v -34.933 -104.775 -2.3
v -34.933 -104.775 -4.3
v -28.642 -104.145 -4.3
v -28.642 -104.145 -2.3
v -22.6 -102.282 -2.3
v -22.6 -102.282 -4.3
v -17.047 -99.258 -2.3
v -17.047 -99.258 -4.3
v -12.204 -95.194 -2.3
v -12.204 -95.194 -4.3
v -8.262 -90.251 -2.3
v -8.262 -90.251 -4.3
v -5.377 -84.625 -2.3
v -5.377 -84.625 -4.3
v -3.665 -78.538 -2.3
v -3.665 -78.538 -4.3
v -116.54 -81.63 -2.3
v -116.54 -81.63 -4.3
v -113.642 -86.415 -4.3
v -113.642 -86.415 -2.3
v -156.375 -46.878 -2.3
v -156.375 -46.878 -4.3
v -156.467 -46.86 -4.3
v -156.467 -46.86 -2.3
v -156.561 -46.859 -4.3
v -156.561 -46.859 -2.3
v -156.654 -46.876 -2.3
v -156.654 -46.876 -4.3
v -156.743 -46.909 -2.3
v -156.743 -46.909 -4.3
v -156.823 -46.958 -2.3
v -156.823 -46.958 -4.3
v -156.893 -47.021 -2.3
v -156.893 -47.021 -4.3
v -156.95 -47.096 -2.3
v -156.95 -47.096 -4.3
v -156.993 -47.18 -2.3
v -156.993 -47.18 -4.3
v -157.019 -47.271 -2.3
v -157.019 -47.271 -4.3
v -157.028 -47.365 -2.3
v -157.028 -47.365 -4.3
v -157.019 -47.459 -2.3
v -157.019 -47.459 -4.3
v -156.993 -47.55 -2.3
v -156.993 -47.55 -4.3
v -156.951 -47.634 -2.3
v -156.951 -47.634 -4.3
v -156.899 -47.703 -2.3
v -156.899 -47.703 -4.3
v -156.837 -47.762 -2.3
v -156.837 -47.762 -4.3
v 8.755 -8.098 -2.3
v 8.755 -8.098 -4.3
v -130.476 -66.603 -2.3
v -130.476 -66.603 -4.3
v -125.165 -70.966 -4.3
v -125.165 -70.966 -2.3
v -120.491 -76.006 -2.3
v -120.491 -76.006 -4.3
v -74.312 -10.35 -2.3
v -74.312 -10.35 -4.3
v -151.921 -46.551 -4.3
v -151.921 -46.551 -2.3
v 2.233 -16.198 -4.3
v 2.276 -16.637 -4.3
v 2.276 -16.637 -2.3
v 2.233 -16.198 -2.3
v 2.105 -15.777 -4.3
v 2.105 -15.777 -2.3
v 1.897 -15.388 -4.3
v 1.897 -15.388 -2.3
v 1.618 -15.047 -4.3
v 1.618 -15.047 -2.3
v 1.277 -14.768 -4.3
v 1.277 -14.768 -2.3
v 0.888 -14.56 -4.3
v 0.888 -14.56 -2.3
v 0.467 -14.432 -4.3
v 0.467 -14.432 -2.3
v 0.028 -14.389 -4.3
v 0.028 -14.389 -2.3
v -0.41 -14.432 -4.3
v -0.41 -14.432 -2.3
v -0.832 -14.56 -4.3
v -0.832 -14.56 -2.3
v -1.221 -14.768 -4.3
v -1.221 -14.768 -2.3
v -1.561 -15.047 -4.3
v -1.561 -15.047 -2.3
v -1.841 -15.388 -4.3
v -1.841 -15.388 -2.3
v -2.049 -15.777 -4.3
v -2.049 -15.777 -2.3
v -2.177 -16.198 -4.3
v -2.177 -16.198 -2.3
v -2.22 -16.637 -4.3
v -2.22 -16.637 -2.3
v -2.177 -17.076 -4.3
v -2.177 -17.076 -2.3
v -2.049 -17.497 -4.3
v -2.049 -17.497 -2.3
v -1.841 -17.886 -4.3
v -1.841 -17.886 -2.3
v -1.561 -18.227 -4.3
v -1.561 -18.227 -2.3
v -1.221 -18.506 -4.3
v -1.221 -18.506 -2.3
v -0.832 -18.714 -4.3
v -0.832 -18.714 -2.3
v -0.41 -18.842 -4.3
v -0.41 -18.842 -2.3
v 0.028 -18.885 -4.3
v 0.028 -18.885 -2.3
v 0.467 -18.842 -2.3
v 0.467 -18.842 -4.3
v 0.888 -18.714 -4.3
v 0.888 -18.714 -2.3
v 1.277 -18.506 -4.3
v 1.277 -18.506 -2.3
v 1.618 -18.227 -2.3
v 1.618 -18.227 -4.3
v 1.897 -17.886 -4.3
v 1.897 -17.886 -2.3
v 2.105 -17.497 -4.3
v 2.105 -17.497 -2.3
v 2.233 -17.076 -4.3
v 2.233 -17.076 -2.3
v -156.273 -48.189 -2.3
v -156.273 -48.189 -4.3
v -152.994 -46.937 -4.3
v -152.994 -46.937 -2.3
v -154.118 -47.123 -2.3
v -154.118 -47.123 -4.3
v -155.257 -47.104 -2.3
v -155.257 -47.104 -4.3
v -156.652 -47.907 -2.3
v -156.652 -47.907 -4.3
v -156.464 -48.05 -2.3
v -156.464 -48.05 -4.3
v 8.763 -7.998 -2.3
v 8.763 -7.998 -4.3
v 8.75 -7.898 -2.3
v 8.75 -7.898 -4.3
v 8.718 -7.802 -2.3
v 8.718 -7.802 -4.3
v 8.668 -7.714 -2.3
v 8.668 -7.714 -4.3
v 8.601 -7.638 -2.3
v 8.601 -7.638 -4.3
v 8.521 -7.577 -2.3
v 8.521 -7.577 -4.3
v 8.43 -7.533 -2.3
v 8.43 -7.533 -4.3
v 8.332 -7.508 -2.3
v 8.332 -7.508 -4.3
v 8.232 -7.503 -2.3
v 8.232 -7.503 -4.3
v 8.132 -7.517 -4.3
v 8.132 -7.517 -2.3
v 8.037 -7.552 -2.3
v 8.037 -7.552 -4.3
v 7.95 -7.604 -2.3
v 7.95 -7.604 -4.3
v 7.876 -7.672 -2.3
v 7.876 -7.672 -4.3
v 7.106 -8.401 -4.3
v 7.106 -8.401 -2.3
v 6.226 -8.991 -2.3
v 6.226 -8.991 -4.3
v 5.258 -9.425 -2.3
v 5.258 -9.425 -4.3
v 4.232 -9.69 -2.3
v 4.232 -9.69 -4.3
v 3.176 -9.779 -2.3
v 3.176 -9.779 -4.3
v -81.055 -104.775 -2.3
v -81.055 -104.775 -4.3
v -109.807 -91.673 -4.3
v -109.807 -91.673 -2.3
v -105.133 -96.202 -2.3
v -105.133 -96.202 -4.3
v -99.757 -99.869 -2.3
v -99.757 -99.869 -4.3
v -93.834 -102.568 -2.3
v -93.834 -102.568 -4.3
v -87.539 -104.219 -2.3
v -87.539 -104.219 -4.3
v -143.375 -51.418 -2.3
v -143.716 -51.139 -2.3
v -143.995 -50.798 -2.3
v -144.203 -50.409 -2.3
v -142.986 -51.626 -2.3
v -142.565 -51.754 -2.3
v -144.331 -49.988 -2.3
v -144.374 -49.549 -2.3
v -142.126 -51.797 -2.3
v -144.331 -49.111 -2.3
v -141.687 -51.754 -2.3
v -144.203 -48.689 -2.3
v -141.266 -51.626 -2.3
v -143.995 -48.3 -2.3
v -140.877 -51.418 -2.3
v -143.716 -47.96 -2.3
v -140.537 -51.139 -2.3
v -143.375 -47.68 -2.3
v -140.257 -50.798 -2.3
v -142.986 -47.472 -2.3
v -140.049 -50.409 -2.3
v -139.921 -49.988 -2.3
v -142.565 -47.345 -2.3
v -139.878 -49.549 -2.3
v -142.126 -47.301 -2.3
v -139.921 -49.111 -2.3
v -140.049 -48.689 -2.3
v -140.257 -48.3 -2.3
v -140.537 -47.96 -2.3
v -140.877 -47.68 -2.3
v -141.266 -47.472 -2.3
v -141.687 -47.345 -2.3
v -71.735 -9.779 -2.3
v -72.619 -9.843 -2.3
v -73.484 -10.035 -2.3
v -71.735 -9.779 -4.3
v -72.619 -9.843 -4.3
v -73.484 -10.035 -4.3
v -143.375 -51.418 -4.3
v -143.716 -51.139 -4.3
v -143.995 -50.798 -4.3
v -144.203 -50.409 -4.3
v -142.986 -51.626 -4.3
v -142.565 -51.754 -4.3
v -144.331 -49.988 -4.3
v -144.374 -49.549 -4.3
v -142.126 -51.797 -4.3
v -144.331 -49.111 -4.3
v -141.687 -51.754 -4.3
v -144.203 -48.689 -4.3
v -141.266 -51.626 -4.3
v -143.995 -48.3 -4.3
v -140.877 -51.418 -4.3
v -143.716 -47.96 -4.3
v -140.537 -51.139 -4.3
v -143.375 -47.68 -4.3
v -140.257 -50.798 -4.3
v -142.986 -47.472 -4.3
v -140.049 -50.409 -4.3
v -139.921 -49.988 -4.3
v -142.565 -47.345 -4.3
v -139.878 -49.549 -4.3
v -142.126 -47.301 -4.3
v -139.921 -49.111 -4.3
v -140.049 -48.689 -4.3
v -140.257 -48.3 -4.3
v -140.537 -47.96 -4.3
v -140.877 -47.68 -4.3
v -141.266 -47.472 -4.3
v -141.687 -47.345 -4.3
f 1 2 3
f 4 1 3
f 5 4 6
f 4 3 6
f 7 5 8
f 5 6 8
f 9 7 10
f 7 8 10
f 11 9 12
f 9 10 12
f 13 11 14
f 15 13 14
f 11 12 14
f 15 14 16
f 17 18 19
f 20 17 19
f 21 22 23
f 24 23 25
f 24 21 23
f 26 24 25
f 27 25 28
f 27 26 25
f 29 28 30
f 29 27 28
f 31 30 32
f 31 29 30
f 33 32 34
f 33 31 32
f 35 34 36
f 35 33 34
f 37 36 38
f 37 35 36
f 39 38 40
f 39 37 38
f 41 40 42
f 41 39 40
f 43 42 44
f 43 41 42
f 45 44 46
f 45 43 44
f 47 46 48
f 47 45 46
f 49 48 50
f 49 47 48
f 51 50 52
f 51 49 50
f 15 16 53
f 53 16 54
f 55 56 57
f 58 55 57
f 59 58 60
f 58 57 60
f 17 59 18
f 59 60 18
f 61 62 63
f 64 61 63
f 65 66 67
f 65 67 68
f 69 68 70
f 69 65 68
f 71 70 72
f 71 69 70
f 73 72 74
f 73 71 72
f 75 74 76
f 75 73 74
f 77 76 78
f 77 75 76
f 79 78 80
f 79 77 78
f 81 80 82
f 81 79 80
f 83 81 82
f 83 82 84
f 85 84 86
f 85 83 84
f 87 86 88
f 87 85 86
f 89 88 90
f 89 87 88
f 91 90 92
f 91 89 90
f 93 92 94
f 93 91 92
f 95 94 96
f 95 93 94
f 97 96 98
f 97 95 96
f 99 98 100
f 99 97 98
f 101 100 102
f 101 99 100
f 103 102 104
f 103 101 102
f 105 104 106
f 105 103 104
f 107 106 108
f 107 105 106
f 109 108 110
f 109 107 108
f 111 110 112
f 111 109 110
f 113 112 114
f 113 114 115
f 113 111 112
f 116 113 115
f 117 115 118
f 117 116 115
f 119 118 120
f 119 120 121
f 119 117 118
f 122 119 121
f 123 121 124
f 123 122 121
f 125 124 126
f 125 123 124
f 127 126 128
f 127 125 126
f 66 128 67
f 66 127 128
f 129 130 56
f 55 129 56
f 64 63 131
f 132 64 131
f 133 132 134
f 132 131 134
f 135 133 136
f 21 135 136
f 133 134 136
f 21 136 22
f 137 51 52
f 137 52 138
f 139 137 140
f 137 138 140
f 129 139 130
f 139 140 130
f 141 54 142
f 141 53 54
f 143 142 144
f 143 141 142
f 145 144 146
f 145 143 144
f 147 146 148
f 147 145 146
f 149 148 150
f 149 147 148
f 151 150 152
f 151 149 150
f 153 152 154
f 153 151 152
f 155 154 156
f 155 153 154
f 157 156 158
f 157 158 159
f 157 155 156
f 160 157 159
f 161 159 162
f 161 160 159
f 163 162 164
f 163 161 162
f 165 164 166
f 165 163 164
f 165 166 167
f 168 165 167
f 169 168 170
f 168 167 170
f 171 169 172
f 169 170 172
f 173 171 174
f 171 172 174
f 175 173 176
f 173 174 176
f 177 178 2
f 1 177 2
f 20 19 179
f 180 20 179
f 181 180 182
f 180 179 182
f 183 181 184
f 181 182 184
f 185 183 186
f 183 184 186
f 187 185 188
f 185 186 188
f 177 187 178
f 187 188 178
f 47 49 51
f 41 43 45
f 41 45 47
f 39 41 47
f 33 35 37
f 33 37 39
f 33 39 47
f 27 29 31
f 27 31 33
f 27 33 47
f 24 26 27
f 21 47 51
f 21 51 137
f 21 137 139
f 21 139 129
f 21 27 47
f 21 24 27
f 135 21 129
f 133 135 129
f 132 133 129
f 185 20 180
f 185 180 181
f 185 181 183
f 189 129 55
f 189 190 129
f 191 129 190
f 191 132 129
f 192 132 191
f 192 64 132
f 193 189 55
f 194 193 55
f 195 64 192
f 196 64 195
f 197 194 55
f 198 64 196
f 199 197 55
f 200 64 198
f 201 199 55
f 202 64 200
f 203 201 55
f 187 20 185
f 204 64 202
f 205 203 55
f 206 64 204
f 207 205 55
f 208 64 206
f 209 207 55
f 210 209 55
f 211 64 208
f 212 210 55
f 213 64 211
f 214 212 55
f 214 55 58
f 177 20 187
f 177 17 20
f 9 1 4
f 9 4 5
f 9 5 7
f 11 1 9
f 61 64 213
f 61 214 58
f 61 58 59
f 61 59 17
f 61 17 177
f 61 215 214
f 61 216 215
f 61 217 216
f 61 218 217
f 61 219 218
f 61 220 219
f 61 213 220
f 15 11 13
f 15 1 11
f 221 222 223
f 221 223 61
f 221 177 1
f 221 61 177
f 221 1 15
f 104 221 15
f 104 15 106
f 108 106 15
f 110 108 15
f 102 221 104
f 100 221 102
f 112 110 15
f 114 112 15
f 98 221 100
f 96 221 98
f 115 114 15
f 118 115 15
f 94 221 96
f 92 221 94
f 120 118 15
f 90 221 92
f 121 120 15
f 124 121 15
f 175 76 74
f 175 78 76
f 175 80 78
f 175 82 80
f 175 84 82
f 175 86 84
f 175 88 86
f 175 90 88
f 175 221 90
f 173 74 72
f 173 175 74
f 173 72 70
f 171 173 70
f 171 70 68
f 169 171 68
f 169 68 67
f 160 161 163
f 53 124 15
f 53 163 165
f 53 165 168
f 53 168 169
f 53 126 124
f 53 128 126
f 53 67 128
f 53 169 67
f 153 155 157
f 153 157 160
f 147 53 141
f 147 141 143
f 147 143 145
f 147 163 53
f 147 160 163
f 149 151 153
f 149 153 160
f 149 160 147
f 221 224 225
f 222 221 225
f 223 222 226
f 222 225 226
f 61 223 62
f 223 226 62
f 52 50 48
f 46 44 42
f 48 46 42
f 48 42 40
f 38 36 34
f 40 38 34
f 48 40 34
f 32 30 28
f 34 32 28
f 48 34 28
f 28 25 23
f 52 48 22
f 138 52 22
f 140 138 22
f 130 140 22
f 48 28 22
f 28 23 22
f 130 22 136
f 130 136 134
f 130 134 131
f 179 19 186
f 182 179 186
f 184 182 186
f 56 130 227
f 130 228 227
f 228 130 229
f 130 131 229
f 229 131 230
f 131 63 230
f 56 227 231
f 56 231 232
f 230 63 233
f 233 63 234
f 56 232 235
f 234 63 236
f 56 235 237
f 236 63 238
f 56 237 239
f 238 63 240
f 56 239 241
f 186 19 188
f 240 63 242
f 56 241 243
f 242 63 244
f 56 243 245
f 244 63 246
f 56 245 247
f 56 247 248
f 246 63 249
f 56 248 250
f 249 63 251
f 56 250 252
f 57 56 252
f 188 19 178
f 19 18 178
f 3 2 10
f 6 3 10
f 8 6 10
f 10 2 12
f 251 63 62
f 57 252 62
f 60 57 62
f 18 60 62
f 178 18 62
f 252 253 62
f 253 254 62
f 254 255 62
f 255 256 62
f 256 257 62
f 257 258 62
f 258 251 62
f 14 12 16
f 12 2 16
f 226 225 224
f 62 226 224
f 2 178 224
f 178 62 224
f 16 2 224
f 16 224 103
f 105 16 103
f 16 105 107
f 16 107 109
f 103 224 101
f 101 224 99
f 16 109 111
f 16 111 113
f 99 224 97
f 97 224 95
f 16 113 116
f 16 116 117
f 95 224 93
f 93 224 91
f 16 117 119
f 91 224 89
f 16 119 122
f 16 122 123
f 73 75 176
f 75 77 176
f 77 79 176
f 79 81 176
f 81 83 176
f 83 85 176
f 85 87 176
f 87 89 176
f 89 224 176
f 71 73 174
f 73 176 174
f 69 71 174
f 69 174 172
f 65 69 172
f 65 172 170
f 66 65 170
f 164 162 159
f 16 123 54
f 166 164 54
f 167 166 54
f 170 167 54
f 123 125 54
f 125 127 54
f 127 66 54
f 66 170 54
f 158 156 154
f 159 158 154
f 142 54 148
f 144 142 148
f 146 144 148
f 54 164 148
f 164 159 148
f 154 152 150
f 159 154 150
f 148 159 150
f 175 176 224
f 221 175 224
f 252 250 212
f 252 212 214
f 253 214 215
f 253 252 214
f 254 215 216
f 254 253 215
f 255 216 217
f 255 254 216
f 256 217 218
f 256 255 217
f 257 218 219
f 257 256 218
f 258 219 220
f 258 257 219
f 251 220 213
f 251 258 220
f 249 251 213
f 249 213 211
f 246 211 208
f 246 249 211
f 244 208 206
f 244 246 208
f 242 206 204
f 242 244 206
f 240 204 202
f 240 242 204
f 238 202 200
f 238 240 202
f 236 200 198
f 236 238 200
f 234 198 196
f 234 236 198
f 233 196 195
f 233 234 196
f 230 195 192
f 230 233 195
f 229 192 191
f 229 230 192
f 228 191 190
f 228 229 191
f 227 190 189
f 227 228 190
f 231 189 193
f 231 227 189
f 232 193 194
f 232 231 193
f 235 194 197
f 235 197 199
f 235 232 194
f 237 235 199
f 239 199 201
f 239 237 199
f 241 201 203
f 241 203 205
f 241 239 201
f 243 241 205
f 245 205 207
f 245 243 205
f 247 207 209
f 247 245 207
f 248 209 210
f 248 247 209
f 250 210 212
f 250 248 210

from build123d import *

# Parameters (mm, degrees)
BOSS_EXTRUDE1_OUTLINE_R = 2.2479
BOSS_EXTRUDE1_DEPTH     = 2
FILLET1_R               = 0.508


# Read off the part's stored shape, not the designer's step: Boss-Extrude1
with BuildPart() as part:
    # Boss-Extrude1 outline → Boss-Extrude1 (new body)
    with BuildSketch(Plane.XY.offset(-4.3)):
        with BuildLine():
            Line((-3.665078359, -78.538329641), (9.376516015, -4.575772565))
            ThreePointArc((9.376516015, -4.575772565), (7.222943475, -8.305869622), (3.175551027, -9.779))
            Line((3.175551027, -9.779), (-71.734942292, -9.779))
            ThreePointArc((-71.734942292, -9.779), (-73.054687902, -9.923572648), (-74.311835376, -10.350433227))
            Line((-74.311835376, -10.350433227), (-151.921287837, -46.550785133))
            ThreePointArc((-151.921287837, -46.550785133), (-156.284298691, -46.904620517), (-159.820994296, -44.325309098))
            ThreePointArc((-159.820994296, -44.325309098), (-158.24873565, -46.442088317), (-156.273248149, -48.188570679))
            Line((-156.273248149, -48.188570679), (-130.476004779, -66.603469659))
            ThreePointArc((-130.476004779, -66.603469659), (-122.742535166, -73.406833136), (-116.540360394, -81.630295604))
            Line((-116.540360394, -81.630295604), (-113.642182841, -86.414778297))
            ThreePointArc((-113.642182841, -86.414778297), (-99.756521843, -99.869092495), (-81.054590835, -104.775))
            Line((-81.054590835, -104.775), (-34.932724517, -104.775))
            ThreePointArc((-34.932724517, -104.775), (-14.52421791, -97.346911069), (-3.665078359, -78.538329641))
        make_face()
        with Locations((-142.126033439, -49.549218379)):
            Circle(BOSS_EXTRUDE1_OUTLINE_R, mode=Mode.SUBTRACT)
        with Locations((0.028082134, -16.637)):
            Circle(BOSS_EXTRUDE1_OUTLINE_R, mode=Mode.SUBTRACT)
    extrude(amount=BOSS_EXTRUDE1_DEPTH)

    # Fillet1
    fillet1_edges = [part.edges().sort_by_distance(p)[0] for p in [
        (9.376516015, -4.575772565, -3.3),
        (-159.820994296, -44.325309098, -3.3),
    ]]
    fillet(fillet1_edges, radius=FILLET1_R)


solid = part.part
